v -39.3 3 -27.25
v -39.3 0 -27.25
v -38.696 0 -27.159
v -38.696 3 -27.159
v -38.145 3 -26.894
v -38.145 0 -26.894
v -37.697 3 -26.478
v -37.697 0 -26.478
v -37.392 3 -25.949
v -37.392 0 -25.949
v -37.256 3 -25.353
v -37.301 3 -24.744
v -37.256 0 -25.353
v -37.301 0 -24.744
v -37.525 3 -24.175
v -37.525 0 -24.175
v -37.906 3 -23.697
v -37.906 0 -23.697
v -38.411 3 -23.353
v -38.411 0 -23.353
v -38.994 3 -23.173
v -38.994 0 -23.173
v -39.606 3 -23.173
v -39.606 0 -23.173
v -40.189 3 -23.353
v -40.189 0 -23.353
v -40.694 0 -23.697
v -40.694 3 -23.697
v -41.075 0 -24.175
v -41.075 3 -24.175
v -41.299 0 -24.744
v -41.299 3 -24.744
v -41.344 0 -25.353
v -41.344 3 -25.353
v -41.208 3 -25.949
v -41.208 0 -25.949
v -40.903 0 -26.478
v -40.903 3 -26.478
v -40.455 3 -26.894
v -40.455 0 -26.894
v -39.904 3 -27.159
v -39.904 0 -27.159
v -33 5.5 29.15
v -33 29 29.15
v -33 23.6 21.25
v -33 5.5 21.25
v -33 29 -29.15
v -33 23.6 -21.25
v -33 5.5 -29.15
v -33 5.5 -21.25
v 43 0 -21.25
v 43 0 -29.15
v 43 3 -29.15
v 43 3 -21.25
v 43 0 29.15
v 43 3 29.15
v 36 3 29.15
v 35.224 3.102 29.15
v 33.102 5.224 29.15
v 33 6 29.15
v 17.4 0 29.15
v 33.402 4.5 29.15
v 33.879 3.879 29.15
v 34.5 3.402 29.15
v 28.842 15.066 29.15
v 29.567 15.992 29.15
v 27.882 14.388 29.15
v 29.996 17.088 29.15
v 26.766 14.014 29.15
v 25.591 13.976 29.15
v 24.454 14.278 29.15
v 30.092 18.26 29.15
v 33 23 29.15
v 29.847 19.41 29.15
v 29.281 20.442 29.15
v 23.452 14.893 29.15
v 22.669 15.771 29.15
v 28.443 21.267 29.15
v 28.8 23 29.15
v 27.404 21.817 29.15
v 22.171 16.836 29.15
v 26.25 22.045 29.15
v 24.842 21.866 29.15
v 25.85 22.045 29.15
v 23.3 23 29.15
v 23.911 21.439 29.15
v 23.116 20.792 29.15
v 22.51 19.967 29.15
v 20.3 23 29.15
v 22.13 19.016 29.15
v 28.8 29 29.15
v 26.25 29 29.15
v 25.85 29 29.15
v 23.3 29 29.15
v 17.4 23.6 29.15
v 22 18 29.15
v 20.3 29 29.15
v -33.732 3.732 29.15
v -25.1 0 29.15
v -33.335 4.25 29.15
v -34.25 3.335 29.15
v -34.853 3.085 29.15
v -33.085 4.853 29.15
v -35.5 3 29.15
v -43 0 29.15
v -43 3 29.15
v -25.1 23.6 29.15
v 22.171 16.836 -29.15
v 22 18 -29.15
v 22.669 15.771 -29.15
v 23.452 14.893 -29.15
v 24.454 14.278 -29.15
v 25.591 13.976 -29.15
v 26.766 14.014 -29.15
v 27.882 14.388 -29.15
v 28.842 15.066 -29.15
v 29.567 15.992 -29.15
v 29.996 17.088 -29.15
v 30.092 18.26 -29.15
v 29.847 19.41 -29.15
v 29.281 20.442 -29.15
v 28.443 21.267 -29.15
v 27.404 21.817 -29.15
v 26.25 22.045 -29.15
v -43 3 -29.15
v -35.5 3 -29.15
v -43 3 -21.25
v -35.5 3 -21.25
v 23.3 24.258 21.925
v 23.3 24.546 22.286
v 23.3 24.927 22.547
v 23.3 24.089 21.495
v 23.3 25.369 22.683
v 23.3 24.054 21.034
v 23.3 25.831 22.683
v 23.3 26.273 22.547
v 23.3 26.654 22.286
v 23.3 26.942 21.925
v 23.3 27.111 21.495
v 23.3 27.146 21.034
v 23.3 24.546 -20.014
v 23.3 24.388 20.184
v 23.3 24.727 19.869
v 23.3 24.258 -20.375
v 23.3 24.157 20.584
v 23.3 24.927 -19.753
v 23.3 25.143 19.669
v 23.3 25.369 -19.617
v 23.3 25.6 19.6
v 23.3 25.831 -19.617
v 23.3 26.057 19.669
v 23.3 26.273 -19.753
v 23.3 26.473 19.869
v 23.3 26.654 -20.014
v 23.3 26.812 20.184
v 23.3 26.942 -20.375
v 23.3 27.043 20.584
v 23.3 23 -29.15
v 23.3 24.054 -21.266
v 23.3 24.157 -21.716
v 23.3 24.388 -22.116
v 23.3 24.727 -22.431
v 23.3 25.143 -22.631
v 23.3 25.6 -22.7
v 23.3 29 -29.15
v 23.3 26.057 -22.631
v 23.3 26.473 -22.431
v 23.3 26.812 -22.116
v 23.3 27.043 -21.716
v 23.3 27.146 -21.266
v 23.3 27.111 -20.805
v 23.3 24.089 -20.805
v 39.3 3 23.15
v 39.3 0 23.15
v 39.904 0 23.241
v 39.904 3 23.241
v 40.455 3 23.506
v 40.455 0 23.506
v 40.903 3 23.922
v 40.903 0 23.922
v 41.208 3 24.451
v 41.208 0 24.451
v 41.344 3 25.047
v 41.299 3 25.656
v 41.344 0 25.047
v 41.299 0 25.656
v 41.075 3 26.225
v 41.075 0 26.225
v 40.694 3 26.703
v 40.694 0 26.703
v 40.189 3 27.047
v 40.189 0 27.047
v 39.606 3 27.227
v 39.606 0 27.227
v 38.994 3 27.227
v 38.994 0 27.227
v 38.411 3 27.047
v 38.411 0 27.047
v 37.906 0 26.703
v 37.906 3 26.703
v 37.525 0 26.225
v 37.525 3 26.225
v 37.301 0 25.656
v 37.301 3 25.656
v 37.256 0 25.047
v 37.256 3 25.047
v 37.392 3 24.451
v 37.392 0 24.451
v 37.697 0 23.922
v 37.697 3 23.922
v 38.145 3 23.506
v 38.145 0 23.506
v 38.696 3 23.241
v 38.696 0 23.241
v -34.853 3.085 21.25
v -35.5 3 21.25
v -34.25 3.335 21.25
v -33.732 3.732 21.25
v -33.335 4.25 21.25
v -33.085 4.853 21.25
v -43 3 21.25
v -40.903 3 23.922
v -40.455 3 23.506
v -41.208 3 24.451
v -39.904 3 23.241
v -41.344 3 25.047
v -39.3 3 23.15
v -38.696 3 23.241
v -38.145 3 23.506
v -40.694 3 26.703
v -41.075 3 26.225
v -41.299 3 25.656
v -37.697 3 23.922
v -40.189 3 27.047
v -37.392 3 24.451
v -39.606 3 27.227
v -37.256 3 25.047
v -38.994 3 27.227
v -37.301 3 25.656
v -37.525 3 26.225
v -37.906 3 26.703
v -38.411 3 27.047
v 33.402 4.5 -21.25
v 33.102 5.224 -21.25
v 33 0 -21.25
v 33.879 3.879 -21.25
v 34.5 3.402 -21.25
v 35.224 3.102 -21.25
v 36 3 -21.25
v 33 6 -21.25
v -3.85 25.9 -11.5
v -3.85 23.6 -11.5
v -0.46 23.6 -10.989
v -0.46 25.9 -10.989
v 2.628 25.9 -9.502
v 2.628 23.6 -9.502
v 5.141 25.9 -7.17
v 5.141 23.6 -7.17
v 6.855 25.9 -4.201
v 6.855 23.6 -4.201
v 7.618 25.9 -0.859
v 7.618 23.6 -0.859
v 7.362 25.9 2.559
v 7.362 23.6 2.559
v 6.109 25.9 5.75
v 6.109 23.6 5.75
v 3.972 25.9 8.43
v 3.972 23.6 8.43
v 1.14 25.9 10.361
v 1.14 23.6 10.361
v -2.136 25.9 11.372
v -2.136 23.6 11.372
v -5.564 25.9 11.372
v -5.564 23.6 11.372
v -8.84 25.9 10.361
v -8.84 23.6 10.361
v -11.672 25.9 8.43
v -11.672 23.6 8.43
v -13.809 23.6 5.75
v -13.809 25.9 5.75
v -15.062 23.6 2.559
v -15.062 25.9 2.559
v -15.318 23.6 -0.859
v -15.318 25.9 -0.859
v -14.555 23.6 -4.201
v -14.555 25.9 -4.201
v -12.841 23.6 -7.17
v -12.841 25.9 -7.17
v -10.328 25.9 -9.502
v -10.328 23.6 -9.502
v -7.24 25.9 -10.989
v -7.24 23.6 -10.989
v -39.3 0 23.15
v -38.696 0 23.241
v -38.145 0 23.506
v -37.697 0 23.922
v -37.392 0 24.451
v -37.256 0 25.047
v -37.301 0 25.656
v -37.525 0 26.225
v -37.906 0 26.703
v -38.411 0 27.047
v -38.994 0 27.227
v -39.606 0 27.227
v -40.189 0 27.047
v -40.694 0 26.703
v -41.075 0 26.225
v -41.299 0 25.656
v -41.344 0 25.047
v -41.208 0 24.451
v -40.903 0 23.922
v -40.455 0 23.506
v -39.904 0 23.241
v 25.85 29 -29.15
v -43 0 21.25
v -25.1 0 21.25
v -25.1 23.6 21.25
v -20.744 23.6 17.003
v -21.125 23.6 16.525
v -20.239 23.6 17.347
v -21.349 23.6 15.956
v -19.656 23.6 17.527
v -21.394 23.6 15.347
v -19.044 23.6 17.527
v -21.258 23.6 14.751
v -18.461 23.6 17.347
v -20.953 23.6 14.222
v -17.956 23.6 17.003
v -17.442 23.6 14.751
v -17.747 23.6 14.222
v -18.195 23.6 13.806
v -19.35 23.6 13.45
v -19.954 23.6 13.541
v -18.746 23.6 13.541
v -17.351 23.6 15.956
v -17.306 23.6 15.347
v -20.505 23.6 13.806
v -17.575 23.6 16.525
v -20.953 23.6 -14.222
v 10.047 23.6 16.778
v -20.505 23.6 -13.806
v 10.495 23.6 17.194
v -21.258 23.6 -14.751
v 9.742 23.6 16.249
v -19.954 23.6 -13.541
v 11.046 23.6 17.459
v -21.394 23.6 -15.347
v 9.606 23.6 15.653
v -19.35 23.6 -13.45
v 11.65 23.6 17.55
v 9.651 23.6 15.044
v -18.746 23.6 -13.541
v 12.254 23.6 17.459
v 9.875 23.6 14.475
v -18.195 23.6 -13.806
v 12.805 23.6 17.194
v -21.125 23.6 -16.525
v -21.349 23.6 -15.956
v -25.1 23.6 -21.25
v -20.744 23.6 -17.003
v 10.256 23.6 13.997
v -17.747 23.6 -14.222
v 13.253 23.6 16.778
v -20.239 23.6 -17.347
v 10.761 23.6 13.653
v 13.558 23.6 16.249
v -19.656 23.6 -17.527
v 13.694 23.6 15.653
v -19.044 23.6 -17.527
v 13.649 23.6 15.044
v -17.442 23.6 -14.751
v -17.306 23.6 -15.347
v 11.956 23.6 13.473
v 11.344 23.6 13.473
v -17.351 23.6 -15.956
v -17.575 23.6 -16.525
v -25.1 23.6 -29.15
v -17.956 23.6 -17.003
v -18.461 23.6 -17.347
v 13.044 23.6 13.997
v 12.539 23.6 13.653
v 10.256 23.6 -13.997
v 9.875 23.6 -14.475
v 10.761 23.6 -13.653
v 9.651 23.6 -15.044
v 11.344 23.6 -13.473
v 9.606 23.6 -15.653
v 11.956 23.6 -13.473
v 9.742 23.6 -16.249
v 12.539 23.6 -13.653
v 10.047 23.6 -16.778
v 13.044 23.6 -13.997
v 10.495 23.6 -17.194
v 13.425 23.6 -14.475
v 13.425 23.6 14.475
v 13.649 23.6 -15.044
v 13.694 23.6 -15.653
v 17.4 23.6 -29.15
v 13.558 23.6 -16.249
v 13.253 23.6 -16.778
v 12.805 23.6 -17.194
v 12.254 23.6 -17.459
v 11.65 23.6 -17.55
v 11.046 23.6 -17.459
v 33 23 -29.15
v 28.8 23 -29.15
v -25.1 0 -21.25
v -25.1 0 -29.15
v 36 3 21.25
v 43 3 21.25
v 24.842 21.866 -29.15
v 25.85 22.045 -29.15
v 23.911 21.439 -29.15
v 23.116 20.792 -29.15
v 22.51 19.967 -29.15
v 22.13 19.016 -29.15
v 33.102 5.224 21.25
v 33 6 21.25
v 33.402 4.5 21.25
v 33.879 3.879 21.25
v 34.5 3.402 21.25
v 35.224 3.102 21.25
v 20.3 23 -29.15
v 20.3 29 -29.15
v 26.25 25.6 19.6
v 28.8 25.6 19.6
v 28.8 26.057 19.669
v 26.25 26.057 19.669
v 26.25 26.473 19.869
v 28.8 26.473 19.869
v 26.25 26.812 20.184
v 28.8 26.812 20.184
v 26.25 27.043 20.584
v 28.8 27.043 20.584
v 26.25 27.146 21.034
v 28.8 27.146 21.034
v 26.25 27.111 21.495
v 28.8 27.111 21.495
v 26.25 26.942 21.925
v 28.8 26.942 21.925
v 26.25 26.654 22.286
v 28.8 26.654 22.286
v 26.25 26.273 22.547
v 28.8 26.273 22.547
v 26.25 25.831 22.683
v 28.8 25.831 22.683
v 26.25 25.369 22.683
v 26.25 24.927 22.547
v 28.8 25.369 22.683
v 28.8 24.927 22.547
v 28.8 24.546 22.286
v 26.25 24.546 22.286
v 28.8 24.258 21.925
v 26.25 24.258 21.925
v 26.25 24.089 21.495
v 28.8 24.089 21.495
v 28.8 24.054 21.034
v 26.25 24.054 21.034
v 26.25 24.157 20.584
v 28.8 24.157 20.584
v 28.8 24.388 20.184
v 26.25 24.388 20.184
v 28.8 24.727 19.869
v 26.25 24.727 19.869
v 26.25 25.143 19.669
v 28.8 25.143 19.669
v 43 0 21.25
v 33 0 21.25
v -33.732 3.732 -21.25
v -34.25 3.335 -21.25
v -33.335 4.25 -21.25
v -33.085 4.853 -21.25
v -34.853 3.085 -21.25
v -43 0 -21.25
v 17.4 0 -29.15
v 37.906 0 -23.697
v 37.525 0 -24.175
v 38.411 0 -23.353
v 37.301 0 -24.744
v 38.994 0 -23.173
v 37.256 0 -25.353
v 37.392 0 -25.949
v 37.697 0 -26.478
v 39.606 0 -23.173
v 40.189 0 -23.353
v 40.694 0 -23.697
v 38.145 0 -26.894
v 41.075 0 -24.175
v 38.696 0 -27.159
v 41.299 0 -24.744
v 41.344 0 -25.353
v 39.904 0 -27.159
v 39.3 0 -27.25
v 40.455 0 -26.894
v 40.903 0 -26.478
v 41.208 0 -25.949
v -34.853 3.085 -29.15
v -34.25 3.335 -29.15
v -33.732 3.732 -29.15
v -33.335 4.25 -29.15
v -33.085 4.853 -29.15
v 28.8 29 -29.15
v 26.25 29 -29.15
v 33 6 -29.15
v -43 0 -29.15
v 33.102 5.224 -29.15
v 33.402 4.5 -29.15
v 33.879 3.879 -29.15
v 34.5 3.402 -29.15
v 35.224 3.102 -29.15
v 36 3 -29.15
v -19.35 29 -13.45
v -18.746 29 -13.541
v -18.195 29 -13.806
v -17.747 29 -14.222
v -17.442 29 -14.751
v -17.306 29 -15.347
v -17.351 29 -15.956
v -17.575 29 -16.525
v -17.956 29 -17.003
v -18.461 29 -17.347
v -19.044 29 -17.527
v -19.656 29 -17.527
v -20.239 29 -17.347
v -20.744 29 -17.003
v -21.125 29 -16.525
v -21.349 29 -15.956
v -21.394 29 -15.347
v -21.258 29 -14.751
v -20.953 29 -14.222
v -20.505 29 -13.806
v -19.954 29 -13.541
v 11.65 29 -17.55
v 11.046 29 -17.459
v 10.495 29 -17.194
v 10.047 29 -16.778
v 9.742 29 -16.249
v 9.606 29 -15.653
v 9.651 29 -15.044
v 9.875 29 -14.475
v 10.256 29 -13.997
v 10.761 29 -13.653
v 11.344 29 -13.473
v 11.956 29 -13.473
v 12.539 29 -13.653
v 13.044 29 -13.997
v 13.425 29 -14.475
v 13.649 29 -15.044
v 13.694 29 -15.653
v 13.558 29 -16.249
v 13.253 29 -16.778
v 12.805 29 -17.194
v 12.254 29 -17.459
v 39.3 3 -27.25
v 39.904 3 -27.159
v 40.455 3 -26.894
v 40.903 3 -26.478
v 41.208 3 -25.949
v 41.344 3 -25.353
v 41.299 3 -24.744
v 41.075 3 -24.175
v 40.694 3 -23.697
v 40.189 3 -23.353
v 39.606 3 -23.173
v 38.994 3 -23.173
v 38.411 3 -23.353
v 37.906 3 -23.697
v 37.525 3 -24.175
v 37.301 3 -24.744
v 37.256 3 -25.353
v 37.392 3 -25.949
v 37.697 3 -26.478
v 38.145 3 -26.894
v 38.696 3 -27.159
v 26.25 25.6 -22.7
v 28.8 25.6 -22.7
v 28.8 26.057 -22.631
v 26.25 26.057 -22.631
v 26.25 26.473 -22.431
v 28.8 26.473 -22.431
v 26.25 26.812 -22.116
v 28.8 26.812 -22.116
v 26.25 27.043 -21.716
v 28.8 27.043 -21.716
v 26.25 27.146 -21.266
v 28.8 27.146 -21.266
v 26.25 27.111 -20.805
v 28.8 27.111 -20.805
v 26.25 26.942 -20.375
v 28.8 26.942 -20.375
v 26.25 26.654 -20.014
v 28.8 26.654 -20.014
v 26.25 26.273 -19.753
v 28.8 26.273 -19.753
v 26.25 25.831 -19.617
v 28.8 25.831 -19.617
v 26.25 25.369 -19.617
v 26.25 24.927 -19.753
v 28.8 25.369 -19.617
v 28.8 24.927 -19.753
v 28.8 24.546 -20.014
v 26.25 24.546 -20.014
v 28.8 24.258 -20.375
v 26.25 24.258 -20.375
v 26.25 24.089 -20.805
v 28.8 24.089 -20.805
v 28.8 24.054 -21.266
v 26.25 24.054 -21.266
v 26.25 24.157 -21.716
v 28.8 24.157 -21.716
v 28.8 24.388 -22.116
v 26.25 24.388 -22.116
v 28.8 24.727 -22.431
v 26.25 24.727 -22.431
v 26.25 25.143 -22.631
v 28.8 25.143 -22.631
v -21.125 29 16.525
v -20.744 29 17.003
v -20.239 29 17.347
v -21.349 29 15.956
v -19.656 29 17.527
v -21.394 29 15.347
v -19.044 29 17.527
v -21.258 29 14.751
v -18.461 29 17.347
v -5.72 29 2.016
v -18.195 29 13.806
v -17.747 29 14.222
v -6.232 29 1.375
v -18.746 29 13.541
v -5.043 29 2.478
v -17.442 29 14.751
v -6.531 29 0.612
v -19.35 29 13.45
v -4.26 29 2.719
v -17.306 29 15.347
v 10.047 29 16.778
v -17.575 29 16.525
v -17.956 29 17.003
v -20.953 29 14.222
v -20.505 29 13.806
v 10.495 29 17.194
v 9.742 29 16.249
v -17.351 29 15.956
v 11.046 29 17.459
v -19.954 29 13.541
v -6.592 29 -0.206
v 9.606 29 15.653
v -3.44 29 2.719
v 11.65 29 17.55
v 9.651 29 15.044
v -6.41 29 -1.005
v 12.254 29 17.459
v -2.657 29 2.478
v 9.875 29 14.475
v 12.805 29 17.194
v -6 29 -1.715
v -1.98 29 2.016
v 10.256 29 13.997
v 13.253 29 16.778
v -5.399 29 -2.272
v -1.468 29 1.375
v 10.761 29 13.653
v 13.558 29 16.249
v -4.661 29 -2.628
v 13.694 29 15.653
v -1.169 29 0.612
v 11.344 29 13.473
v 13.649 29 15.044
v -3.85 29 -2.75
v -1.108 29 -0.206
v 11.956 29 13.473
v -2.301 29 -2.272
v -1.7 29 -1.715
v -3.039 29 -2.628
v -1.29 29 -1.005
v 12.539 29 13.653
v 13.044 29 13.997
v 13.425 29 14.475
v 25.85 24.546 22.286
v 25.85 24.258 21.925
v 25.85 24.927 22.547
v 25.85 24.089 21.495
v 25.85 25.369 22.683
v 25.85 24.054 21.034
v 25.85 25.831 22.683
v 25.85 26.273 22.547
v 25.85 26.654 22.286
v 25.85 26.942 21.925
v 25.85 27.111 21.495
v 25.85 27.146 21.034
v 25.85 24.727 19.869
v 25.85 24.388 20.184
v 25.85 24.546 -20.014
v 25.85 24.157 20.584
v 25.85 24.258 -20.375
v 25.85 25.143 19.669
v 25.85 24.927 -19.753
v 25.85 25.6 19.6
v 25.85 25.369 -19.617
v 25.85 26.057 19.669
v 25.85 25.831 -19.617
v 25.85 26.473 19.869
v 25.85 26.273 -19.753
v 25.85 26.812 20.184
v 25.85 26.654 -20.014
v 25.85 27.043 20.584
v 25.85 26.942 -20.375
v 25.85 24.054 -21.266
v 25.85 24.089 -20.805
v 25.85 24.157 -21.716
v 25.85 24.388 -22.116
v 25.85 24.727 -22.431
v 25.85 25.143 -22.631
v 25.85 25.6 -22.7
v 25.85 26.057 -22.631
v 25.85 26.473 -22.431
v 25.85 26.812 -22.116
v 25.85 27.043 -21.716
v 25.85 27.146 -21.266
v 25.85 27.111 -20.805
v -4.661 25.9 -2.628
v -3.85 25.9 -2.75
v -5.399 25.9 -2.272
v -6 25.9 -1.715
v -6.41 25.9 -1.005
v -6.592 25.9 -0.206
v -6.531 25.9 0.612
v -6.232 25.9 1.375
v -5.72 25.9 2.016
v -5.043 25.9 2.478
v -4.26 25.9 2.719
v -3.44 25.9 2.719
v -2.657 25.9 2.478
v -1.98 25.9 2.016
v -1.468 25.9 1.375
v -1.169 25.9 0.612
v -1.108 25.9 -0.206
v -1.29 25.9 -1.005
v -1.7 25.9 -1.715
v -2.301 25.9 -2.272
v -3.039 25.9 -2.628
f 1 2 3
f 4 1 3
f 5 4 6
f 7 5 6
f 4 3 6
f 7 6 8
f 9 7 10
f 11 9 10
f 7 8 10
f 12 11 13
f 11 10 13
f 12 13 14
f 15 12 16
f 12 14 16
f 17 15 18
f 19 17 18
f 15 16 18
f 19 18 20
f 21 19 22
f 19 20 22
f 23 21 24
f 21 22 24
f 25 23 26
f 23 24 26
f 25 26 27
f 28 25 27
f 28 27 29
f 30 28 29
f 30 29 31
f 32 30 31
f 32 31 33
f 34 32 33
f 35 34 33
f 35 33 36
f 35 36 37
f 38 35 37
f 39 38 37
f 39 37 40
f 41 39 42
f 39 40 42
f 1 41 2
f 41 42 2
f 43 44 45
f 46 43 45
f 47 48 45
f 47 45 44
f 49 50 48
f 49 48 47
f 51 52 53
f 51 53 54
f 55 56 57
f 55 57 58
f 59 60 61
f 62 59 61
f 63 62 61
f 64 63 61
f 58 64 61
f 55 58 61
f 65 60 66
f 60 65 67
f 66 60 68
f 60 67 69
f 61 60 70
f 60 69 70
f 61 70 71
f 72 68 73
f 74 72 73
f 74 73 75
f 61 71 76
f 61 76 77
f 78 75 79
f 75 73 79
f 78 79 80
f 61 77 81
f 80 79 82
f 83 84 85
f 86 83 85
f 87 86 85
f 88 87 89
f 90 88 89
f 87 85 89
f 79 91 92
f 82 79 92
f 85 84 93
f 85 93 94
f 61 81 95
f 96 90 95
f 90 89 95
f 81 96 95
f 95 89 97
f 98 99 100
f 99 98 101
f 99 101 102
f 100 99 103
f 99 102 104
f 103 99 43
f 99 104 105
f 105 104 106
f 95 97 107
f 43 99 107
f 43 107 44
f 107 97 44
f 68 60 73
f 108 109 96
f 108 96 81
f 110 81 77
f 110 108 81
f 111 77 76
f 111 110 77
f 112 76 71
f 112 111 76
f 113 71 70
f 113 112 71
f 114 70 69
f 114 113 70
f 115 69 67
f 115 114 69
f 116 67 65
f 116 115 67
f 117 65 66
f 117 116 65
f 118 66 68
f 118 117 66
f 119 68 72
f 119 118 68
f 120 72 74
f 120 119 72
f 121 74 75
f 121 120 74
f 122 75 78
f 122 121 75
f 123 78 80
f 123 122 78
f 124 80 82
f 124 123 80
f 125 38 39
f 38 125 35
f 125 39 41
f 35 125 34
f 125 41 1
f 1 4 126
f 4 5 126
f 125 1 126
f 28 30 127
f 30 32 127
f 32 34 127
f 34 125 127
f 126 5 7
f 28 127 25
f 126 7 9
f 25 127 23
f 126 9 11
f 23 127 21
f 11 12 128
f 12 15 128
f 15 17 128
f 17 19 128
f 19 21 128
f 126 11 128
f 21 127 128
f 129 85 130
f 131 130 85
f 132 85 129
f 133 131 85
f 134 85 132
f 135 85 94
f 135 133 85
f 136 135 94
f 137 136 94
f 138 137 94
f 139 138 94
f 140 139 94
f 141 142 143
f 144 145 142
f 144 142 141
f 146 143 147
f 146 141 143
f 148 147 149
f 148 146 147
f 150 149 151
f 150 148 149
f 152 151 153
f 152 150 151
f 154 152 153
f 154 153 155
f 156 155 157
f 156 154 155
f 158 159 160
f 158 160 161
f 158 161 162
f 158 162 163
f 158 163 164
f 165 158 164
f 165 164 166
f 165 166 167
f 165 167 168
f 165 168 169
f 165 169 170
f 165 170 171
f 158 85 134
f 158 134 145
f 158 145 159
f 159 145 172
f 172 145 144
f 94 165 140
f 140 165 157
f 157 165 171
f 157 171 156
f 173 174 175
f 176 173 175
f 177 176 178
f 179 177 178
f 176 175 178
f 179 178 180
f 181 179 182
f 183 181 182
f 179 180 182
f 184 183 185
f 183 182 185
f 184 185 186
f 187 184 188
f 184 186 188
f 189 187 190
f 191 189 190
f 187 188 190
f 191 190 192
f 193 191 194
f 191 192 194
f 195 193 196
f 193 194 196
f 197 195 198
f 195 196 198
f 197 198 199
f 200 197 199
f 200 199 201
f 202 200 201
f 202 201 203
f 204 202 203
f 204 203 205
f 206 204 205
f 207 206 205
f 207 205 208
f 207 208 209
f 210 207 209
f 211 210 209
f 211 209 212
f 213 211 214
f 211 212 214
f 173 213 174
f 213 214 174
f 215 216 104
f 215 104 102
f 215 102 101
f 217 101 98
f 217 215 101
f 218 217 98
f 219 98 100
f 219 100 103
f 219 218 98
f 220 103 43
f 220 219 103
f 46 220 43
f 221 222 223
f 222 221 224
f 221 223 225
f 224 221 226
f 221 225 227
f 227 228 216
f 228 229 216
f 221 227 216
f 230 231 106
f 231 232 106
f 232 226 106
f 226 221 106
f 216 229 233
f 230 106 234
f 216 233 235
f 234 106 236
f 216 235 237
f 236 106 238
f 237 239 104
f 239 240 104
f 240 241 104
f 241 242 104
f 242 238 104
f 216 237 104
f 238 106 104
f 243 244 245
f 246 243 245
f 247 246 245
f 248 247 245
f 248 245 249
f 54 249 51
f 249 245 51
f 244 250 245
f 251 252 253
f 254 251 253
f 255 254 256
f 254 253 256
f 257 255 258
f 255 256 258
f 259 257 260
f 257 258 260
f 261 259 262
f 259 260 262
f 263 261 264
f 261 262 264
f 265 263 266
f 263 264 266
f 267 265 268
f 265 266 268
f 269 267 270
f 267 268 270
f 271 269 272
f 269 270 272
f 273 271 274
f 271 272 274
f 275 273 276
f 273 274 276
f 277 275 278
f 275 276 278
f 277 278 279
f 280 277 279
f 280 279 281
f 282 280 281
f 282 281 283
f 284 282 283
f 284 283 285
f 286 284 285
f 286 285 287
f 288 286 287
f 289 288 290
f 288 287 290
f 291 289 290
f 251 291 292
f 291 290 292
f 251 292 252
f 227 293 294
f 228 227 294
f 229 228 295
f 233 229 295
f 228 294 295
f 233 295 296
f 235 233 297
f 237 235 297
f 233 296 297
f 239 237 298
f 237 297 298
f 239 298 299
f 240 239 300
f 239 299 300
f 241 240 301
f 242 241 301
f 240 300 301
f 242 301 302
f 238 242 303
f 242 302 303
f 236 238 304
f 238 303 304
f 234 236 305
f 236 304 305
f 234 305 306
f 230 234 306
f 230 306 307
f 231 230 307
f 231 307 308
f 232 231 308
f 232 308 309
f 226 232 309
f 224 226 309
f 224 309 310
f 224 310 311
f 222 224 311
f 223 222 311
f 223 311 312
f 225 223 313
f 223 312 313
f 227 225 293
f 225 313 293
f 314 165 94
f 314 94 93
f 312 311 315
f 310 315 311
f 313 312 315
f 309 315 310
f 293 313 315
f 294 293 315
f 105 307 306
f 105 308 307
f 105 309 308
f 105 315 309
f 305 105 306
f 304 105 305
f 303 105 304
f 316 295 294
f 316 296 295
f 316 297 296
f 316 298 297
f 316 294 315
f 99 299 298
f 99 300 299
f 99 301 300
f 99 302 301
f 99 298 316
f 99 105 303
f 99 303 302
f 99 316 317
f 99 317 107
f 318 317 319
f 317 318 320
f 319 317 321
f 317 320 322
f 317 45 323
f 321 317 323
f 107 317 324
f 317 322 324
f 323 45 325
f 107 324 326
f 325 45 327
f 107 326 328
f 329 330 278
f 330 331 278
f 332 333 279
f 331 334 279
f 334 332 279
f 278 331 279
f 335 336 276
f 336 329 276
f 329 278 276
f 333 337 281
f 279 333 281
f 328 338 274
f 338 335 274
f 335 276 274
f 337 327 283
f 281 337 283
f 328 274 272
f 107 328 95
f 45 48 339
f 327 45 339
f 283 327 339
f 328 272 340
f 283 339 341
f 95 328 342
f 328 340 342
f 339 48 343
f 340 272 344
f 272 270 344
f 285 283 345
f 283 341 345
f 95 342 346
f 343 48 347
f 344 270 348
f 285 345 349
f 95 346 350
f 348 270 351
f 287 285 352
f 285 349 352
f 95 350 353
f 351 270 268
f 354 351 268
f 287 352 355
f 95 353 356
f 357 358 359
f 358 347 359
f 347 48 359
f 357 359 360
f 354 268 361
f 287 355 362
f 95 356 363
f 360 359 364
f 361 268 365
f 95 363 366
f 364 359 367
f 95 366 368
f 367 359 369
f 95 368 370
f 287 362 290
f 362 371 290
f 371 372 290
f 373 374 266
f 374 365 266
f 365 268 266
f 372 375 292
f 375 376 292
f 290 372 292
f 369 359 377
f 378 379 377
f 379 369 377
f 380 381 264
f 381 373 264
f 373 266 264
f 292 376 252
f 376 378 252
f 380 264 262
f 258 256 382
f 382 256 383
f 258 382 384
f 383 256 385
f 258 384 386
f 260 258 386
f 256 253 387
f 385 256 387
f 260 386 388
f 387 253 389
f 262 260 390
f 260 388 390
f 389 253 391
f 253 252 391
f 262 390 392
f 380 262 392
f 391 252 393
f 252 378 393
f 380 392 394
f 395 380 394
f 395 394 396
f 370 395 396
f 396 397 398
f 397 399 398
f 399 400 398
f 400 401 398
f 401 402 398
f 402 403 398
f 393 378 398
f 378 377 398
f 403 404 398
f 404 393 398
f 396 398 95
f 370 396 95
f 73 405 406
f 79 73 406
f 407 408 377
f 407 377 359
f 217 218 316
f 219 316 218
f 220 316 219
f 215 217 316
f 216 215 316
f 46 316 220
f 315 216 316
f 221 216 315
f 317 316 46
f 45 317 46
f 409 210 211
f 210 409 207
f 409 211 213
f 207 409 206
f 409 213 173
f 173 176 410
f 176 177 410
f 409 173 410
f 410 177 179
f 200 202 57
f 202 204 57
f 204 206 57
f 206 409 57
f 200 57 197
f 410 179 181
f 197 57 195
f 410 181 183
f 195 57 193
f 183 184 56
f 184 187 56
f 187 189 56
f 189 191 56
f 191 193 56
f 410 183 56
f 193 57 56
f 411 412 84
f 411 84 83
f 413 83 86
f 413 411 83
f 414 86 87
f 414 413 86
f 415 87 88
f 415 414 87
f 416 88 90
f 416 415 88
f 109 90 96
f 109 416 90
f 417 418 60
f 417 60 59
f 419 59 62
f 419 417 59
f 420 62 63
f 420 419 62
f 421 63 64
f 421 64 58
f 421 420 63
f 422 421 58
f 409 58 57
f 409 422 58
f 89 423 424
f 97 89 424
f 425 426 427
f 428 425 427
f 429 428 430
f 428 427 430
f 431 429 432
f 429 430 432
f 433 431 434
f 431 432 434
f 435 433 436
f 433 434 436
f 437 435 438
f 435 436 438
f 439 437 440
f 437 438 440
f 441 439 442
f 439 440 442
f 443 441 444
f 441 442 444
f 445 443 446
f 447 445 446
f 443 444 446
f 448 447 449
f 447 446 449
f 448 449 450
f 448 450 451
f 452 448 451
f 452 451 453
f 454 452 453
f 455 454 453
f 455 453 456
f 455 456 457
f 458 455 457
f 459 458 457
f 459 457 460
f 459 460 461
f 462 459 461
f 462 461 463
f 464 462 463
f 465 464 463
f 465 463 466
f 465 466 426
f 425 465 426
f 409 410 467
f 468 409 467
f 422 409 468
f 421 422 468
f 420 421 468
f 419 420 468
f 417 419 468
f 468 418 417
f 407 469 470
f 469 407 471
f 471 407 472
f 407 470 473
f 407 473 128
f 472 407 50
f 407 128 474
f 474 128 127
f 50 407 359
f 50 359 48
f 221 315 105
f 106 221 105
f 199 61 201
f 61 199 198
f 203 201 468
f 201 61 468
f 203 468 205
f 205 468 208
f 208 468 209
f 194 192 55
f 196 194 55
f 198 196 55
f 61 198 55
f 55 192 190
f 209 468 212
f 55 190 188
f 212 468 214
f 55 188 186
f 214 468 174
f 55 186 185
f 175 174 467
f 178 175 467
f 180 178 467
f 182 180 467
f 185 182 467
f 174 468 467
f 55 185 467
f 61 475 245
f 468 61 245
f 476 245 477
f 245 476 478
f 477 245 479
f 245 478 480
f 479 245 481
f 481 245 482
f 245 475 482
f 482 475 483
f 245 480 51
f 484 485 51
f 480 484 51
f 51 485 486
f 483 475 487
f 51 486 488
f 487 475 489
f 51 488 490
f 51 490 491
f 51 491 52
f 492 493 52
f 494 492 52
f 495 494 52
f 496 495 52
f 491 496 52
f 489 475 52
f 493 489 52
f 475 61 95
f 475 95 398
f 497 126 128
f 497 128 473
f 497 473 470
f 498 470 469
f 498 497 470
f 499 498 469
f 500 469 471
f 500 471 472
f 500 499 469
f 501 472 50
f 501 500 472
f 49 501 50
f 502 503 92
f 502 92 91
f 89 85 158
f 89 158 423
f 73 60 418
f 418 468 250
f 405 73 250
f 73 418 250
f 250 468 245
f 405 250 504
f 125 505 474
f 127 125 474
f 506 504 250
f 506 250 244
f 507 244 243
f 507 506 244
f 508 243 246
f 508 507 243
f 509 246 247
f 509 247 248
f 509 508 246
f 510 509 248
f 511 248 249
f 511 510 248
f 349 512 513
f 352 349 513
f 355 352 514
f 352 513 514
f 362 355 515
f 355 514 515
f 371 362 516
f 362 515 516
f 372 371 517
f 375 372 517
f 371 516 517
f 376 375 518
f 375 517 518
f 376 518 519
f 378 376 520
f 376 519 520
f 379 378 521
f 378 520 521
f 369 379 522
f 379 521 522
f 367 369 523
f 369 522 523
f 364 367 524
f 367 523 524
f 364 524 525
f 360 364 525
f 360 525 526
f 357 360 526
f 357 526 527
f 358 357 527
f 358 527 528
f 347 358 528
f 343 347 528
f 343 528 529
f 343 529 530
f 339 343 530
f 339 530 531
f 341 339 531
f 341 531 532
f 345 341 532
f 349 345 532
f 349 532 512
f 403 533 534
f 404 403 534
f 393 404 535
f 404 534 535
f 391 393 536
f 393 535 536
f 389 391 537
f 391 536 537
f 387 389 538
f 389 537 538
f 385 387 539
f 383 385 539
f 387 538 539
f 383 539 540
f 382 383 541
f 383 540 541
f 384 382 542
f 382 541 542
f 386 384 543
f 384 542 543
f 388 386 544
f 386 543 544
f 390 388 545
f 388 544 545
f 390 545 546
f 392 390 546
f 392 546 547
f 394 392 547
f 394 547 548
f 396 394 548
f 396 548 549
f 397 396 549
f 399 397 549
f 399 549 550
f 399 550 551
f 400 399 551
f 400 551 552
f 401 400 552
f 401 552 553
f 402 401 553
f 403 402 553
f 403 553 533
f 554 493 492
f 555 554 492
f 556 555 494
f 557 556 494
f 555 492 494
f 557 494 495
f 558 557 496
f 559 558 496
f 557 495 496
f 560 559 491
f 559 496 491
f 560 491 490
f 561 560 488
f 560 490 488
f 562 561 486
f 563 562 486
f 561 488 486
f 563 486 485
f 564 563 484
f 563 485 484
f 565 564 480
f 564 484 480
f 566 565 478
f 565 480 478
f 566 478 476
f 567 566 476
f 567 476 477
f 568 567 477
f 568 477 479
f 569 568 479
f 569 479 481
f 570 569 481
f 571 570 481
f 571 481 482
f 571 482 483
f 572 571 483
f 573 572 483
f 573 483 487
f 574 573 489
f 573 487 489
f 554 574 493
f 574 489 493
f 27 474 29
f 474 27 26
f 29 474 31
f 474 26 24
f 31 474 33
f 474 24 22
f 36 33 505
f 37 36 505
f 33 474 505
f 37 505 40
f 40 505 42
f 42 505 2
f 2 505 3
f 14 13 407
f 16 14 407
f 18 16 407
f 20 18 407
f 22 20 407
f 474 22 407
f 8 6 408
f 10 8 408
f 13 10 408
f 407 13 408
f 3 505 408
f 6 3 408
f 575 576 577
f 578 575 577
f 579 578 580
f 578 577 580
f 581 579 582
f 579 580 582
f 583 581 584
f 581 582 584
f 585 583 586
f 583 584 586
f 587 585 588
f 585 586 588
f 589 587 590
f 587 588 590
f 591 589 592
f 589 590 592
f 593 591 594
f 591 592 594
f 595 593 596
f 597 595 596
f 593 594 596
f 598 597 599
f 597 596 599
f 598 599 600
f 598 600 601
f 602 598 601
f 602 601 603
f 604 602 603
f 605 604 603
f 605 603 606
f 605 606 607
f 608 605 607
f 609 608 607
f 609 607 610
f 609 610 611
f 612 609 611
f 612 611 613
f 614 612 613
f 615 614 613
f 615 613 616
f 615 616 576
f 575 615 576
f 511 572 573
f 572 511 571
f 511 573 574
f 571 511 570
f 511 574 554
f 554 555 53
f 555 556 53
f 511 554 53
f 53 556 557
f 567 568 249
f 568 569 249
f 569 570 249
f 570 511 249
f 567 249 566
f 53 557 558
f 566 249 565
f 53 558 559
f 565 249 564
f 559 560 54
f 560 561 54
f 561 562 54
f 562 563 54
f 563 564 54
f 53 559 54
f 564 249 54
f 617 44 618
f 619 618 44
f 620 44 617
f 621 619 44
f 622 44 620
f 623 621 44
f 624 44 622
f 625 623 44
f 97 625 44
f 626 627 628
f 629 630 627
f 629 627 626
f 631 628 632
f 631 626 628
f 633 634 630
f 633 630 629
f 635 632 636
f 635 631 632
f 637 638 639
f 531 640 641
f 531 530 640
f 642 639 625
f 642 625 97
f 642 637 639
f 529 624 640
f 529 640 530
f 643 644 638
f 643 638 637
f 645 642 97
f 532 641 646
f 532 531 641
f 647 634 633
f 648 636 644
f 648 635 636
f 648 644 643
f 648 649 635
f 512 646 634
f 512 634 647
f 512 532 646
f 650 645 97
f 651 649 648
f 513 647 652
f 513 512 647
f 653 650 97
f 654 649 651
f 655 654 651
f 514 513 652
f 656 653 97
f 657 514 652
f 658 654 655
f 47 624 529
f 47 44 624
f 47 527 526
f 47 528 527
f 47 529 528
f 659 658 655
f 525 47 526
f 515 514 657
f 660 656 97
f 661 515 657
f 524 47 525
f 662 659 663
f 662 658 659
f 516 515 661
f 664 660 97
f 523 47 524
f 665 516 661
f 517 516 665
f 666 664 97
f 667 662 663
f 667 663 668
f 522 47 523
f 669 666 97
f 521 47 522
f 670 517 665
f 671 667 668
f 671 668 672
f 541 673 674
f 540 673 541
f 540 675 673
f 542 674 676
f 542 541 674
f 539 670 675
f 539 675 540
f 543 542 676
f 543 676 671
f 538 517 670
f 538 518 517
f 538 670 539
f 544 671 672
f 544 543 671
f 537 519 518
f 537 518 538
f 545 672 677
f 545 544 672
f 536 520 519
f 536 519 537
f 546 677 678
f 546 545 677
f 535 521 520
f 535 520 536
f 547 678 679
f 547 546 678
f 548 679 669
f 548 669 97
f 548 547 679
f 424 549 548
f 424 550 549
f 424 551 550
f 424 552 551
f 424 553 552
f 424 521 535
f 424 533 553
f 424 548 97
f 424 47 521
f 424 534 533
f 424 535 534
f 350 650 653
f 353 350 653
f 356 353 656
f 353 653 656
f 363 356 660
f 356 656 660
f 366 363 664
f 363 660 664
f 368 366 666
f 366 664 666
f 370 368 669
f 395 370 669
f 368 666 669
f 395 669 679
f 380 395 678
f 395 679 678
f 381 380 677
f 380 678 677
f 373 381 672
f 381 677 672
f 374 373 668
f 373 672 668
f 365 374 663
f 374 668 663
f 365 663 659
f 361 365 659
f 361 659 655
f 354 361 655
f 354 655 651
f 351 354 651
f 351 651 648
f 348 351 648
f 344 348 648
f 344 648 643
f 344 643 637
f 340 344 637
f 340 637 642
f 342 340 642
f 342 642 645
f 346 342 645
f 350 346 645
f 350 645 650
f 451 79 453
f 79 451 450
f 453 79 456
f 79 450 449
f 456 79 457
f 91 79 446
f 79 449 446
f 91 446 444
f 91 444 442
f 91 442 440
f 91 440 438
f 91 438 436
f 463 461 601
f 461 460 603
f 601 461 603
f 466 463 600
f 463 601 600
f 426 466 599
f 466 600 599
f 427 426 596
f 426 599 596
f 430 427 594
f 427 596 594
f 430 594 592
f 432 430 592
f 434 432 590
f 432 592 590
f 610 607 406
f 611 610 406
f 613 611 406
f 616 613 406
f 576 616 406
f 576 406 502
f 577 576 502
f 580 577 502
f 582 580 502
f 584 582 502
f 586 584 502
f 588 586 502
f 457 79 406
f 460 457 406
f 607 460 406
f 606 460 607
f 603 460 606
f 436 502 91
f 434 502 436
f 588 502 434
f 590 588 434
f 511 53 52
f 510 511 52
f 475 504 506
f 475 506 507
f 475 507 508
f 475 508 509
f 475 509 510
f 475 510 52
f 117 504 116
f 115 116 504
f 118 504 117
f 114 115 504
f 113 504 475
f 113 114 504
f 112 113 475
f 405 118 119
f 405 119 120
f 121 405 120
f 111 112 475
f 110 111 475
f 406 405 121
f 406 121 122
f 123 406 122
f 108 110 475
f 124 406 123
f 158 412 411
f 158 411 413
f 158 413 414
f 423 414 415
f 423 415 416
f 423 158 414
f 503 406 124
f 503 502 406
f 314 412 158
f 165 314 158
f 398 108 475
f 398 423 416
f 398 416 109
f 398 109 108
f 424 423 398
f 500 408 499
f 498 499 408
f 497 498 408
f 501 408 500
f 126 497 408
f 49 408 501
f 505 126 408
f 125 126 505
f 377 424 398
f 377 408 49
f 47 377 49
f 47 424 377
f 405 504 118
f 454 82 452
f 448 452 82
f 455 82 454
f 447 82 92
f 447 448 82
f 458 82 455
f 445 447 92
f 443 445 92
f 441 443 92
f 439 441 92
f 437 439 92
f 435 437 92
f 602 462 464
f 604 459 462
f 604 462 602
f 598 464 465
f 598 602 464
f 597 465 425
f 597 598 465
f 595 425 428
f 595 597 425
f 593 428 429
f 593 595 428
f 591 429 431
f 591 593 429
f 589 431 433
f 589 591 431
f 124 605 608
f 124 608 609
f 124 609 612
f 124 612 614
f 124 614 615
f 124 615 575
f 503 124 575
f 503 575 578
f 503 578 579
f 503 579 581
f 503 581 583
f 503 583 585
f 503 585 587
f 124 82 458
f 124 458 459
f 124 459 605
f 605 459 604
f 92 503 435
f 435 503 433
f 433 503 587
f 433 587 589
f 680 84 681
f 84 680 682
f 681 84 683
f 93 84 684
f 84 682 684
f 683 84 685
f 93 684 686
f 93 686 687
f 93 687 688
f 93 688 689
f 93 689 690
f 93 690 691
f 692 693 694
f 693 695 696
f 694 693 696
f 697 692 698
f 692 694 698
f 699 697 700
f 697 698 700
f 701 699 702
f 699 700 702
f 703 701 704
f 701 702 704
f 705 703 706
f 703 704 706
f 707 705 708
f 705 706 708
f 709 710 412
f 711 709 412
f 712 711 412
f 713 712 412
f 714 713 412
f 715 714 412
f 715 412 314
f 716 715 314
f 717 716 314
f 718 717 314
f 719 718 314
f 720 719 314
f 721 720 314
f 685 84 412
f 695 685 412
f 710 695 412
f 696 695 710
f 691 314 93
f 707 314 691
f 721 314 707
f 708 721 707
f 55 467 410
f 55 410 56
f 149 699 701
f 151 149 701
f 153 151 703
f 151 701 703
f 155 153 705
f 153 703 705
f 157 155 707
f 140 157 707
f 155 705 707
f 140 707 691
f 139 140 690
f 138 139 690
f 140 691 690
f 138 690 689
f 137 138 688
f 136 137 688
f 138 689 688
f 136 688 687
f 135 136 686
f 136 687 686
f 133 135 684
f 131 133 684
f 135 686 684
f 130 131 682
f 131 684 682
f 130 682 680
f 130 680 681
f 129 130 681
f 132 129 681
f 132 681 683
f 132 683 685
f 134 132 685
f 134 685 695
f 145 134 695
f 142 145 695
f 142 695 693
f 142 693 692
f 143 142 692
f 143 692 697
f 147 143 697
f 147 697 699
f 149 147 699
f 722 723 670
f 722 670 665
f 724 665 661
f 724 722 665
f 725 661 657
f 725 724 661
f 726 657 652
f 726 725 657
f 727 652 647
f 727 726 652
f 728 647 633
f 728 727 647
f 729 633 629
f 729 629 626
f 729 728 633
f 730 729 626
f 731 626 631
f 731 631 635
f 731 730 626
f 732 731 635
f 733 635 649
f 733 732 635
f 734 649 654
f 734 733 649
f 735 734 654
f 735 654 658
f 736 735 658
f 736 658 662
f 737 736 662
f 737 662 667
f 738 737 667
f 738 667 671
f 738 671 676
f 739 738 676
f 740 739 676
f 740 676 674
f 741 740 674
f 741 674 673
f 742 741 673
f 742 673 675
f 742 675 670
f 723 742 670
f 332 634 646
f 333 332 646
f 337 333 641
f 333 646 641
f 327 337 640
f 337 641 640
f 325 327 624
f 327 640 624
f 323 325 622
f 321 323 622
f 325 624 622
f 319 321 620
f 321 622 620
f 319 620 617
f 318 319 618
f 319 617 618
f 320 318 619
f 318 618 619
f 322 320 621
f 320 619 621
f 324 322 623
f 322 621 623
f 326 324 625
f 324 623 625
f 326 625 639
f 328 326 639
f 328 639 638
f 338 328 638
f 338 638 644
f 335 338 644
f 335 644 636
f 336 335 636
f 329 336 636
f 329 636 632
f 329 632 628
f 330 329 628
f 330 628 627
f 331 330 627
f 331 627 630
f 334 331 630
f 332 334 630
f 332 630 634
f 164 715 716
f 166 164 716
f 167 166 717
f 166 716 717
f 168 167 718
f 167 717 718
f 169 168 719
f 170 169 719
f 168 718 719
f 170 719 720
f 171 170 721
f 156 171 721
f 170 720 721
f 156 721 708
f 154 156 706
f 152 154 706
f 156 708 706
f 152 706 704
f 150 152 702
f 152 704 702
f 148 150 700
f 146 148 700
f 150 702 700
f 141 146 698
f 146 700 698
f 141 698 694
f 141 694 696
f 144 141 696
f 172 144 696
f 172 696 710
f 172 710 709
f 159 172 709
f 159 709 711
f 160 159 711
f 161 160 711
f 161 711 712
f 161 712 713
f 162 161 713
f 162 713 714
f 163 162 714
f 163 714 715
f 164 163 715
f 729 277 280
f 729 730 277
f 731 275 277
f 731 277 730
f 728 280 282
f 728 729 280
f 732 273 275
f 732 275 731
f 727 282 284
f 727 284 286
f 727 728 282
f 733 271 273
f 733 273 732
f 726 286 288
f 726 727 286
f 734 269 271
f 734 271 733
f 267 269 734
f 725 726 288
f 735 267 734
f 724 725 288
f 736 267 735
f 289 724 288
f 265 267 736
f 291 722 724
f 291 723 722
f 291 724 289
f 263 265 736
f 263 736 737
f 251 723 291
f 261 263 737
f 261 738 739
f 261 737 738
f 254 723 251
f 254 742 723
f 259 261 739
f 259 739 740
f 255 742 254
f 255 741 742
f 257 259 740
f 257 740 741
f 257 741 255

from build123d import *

# Parameters (mm, degrees)
SKETCH1_W           = 66
SKETCH1_H           = 58.3
SKETCH1_R           = 2.75
BOSS_EXTRUDE1_DEPTH = 29
CUT_EXTRUDE1_START  = -29
CUT_EXTRUDE1_DEPTH  = 23.6
SKETCH4_R           = 11.5
CUT_EXTRUDE2_DEPTH  = 2.3
CUT_EXTRUDE3_REACH  = 54.723
SKETCH5_R           = 2.05
SKETCH6_W           = 10
SKETCH6_H           = 7.9
SKETCH6_R           = 2.05
BOSS_EXTRUDE2_DEPTH = 3
BOSS_EXTRUDE4_DEPTH = 7.9
BOSS_EXTRUDE5_START = -50.4
BOSS_EXTRUDE5_DEPTH = 7.9
CUT_EXTRUDE4_START  = -58.3
SKETCH8_R           = 4.05
CUT_EXTRUDE4_DEPTH  = 58.3
CUT_EXTRUDE5_REACH  = 80.031
SKETCH10_W          = 3
SKETCH10_H          = 6
SKETCH10_W_2        = 4.2
SKETCH10_W_3        = 0.4
SKETCH10_H_2        = 7.6
CUT_EXTRUDE6_REACH  = 84.74
SKETCH11_R          = 1.55


with BuildPart() as part:
    # Sketch1 → Boss-Extrude1 (new body)
    with BuildSketch(Plane(origin=(0, 0, 0), x_dir=(1, 0, 0), z_dir=(0, 1, 0))):
        Rectangle(SKETCH1_W, SKETCH1_H)
        with Locations(Location((-3.85, 0, 0), (0, 0, 90))):
            Circle(SKETCH1_R, mode=Mode.SUBTRACT)
    extrude(amount=BOSS_EXTRUDE1_DEPTH)

    # Sketch3 → Cut-Extrude1 (cut)
    with BuildSketch(Plane(origin=(0, 29, 0), x_dir=(1, 0, 0), z_dir=(0, 1, 0)).offset(CUT_EXTRUDE1_START)):
        Polygon((-33, 21.25), (-33, -21.25), (-25.1, -21.25), (-25.1, -29.15), (17.4, -29.15), (17.4, 29.15), (-25.1, 29.15), (-25.1, 21.25), align=None)
    extrude(amount=CUT_EXTRUDE1_DEPTH, mode=Mode.SUBTRACT)

    # Sketch4 → Cut-Extrude2 (cut)
    with BuildSketch(Plane.XZ.offset(-23.6)):
        with Locations(Location((-3.85, 0, 0), (0, 0, 270))):
            Circle(SKETCH4_R)
    extrude(amount=-CUT_EXTRUDE2_DEPTH, mode=Mode.SUBTRACT)

    # Sketch5 → Cut-Extrude3 (cut, up to next)
    with BuildSketch(Plane(origin=(0, 29, 0), x_dir=(1, 0, 0), z_dir=(0, 1, 0)), mode=Mode.PRIVATE) as cut_extrude3_sk1:
        with Locations(Location((-19.35, 15.5, 0), (0, 0, 270))):
            Circle(SKETCH5_R)
    cut_extrude3_tool1 = extrude(cut_extrude3_sk1.sketch, amount=-CUT_EXTRUDE3_REACH, mode=Mode.PRIVATE) & part.part
    # Sketch5 → Cut-Extrude3 (cut, up to next)
    with BuildSketch(Plane(origin=(0, 29, 0), x_dir=(1, 0, 0), z_dir=(0, 1, 0)), mode=Mode.PRIVATE) as cut_extrude3_sk2:
        with Locations(Location((11.65, 15.5, 0), (0, 0, 90))):
            Circle(SKETCH5_R)
    cut_extrude3_tool2 = extrude(cut_extrude3_sk2.sketch, amount=-CUT_EXTRUDE3_REACH, mode=Mode.PRIVATE) & part.part
    # Sketch5 → Cut-Extrude3 (cut, up to next)
    with BuildSketch(Plane(origin=(0, 29, 0), x_dir=(1, 0, 0), z_dir=(0, 1, 0)), mode=Mode.PRIVATE) as cut_extrude3_sk3:
        with Locations(Location((11.65, -15.5, 0), (0, 0, 270))):
            Circle(SKETCH5_R)
    cut_extrude3_tool3 = extrude(cut_extrude3_sk3.sketch, amount=-CUT_EXTRUDE3_REACH, mode=Mode.PRIVATE) & part.part
    # Sketch5 → Cut-Extrude3 (cut, up to next)
    with BuildSketch(Plane(origin=(0, 29, 0), x_dir=(1, 0, 0), z_dir=(0, 1, 0)), mode=Mode.PRIVATE) as cut_extrude3_sk4:
        with Locations(Location((-19.35, -15.5, 0), (0, 0, 90))):
            Circle(SKETCH5_R)
    cut_extrude3_tool4 = extrude(cut_extrude3_sk4.sketch, amount=-CUT_EXTRUDE3_REACH, mode=Mode.PRIVATE) & part.part
    add(cut_extrude3_tool1.solids().sort_by_distance((-19.35, 29, -15.5))[0], mode=Mode.SUBTRACT)
    add(cut_extrude3_tool2.solids().sort_by_distance((11.65, 29, -15.5))[0], mode=Mode.SUBTRACT)
    add(cut_extrude3_tool3.solids().sort_by_distance((11.65, 29, 15.5))[0], mode=Mode.SUBTRACT)
    add(cut_extrude3_tool4.solids().sort_by_distance((-19.35, 29, 15.5))[0], mode=Mode.SUBTRACT)

    # Sketch6 → Boss-Extrude2 (add)
    # profile 1 of 4: a face of its own
    with BuildSketch(Plane.XZ):
        with Locations((-38, 25.2)):
            Rectangle(SKETCH6_W, SKETCH6_H)
        with Locations(Location((-39.3, 25.2, 0), (0, 0, 270))):
            Circle(SKETCH6_R, mode=Mode.SUBTRACT)
    # profile 2 of 4: a face of its own
    with BuildSketch(Plane.XZ):
        with Locations((-38, -25.2)):
            Rectangle(SKETCH6_W, SKETCH6_H)
        with Locations(Location((-39.3, -25.2, 0), (0, 0, 270))):
            Circle(SKETCH6_R, mode=Mode.SUBTRACT)
    # profile 3 of 4: a face of its own
    with BuildSketch(Plane.XZ):
        with Locations((38, 25.2)):
            Rectangle(SKETCH6_W, SKETCH6_H)
        with Locations(Location((39.3, 25.2, 0), (0, 0, 270))):
            Circle(SKETCH6_R, mode=Mode.SUBTRACT)
    # profile 4 of 4: a face of its own
    with BuildSketch(Plane.XZ):
        with Locations((38, -25.2)):
            Rectangle(SKETCH6_W, SKETCH6_H)
        with Locations(Location((39.3, -25.2, 0), (0, 0, 270))):
            Circle(SKETCH6_R, mode=Mode.SUBTRACT)
    extrude(amount=-BOSS_EXTRUDE2_DEPTH)

    # Sketch7 → Boss-Extrude4 (add)
    with BuildSketch(Plane(origin=(0, 0, -29.15), x_dir=(-1, 0, 0), z_dir=(0, 0, -1))):
        with BuildLine():
            ThreePointArc((35.5, 3), (33.732233047, 3.732233047), (33, 5.5))
            Line((33, 5.5), (33, 3))
            Line((33, 3), (35.5, 3))
        make_face()
        with BuildLine():
            ThreePointArc((-33, 6), (-33.878679656, 3.878679656), (-36, 3))
            Line((-36, 3), (-33, 3))
            Line((-33, 3), (-33, 6))
        make_face()
    extrude(amount=-BOSS_EXTRUDE4_DEPTH)

    # Sketch7<5> → Boss-Extrude5 (add)
    with BuildSketch(Plane(origin=(0, 0, -29.15), x_dir=(-1, 0, 0), z_dir=(0, 0, -1)).offset(BOSS_EXTRUDE5_START)):
        with BuildLine():
            ThreePointArc((35.5, 3), (33.732233047, 3.732233047), (33, 5.5))
            Line((33, 5.5), (33, 3))
            Line((33, 3), (35.5, 3))
        make_face()
        with BuildLine():
            ThreePointArc((-33, 6), (-33.878679656, 3.878679656), (-36, 3))
            Line((-36, 3), (-33, 3))
            Line((-33, 3), (-33, 6))
        make_face()
    extrude(amount=-BOSS_EXTRUDE5_DEPTH)

    # Sketch8 → Cut-Extrude4 (cut)
    with BuildSketch(Plane.XY.offset(29.15).offset(CUT_EXTRUDE4_START)):
        with Locations(Location((26.05, 18, 0), (0, 0, 180))):
            Circle(SKETCH8_R)
    extrude(amount=CUT_EXTRUDE4_DEPTH, mode=Mode.SUBTRACT)

    # Sketch10 → Cut-Extrude5 (cut, up to next)
    with BuildSketch(Plane(origin=(0, 0, -29.15), x_dir=(-1, 0, 0), z_dir=(0, 0, -1)), mode=Mode.PRIVATE) as cut_extrude5_sk1:
        with Locations((-21.8, 26)):
            Rectangle(SKETCH10_W, SKETCH10_H)
    cut_extrude5_tool1 = extrude(cut_extrude5_sk1.sketch, amount=-CUT_EXTRUDE5_REACH, mode=Mode.PRIVATE) & part.part
    # Sketch10 → Cut-Extrude5 (cut, up to next)
    with BuildSketch(Plane(origin=(0, 0, -29.15), x_dir=(-1, 0, 0), z_dir=(0, 0, -1)), mode=Mode.PRIVATE) as cut_extrude5_sk2:
        with Locations((-30.9, 26)):
            Rectangle(SKETCH10_W_2, SKETCH10_H)
    cut_extrude5_tool2 = extrude(cut_extrude5_sk2.sketch, amount=-CUT_EXTRUDE5_REACH, mode=Mode.PRIVATE) & part.part
    # Sketch10 → Cut-Extrude5 (cut, up to next)
    with BuildSketch(Plane(origin=(0, 0, -29.15), x_dir=(-1, 0, 0), z_dir=(0, 0, -1)), mode=Mode.PRIVATE) as cut_extrude5_sk3:
        with Locations((-26.05, 25.2)):
            Rectangle(SKETCH10_W_3, SKETCH10_H_2)
    cut_extrude5_tool3 = extrude(cut_extrude5_sk3.sketch, amount=-CUT_EXTRUDE5_REACH, mode=Mode.PRIVATE) & part.part
    add(cut_extrude5_tool1.solids().sort_by_distance((21.8, 26, -29.15))[0], mode=Mode.SUBTRACT)
    add(cut_extrude5_tool2.solids().sort_by_distance((30.9, 26, -29.15))[0], mode=Mode.SUBTRACT)
    add(cut_extrude5_tool3.solids().sort_by_distance((26.05, 25.2, -29.15))[0], mode=Mode.SUBTRACT)

    # Cut-Extrude6: up to this face of the body (flat: up to its plane)
    cut_extrude6_end = Plane(part.part.faces().sort_by_distance((23.3, 26, 0))[0])
    # Sketch11 → Cut-Extrude6 (cut, up to the picked face)
    with BuildSketch(Plane(origin=(28.8, 0, 0), x_dir=(0, 0, -1), z_dir=(1, 0, 0)), mode=Mode.PRIVATE) as cut_extrude6_sk1:
        with Locations((-21.15, 25.6)):
            Circle(SKETCH11_R)
    cut_extrude6_tool1 = split(extrude(cut_extrude6_sk1.sketch, amount=-CUT_EXTRUDE6_REACH, mode=Mode.PRIVATE), bisect_by=cut_extrude6_end, keep=Keep.BOTH, mode=Mode.PRIVATE)
    # Sketch11 → Cut-Extrude6 (cut, up to the picked face)
    with BuildSketch(Plane(origin=(28.8, 0, 0), x_dir=(0, 0, -1), z_dir=(1, 0, 0)), mode=Mode.PRIVATE) as cut_extrude6_sk2:
        with Locations((21.15, 25.6)):
            Circle(SKETCH11_R)
    cut_extrude6_tool2 = split(extrude(cut_extrude6_sk2.sketch, amount=-CUT_EXTRUDE6_REACH, mode=Mode.PRIVATE), bisect_by=cut_extrude6_end, keep=Keep.BOTH, mode=Mode.PRIVATE)
    add(cut_extrude6_tool1.solids().sort_by(Axis((28.8, 25.6, 21.15), (-1, 0, 0)))[0], mode=Mode.SUBTRACT)
    add(cut_extrude6_tool2.solids().sort_by(Axis((28.8, 25.6, -21.15), (-1, 0, 0)))[0], mode=Mode.SUBTRACT)


solid = part.part
